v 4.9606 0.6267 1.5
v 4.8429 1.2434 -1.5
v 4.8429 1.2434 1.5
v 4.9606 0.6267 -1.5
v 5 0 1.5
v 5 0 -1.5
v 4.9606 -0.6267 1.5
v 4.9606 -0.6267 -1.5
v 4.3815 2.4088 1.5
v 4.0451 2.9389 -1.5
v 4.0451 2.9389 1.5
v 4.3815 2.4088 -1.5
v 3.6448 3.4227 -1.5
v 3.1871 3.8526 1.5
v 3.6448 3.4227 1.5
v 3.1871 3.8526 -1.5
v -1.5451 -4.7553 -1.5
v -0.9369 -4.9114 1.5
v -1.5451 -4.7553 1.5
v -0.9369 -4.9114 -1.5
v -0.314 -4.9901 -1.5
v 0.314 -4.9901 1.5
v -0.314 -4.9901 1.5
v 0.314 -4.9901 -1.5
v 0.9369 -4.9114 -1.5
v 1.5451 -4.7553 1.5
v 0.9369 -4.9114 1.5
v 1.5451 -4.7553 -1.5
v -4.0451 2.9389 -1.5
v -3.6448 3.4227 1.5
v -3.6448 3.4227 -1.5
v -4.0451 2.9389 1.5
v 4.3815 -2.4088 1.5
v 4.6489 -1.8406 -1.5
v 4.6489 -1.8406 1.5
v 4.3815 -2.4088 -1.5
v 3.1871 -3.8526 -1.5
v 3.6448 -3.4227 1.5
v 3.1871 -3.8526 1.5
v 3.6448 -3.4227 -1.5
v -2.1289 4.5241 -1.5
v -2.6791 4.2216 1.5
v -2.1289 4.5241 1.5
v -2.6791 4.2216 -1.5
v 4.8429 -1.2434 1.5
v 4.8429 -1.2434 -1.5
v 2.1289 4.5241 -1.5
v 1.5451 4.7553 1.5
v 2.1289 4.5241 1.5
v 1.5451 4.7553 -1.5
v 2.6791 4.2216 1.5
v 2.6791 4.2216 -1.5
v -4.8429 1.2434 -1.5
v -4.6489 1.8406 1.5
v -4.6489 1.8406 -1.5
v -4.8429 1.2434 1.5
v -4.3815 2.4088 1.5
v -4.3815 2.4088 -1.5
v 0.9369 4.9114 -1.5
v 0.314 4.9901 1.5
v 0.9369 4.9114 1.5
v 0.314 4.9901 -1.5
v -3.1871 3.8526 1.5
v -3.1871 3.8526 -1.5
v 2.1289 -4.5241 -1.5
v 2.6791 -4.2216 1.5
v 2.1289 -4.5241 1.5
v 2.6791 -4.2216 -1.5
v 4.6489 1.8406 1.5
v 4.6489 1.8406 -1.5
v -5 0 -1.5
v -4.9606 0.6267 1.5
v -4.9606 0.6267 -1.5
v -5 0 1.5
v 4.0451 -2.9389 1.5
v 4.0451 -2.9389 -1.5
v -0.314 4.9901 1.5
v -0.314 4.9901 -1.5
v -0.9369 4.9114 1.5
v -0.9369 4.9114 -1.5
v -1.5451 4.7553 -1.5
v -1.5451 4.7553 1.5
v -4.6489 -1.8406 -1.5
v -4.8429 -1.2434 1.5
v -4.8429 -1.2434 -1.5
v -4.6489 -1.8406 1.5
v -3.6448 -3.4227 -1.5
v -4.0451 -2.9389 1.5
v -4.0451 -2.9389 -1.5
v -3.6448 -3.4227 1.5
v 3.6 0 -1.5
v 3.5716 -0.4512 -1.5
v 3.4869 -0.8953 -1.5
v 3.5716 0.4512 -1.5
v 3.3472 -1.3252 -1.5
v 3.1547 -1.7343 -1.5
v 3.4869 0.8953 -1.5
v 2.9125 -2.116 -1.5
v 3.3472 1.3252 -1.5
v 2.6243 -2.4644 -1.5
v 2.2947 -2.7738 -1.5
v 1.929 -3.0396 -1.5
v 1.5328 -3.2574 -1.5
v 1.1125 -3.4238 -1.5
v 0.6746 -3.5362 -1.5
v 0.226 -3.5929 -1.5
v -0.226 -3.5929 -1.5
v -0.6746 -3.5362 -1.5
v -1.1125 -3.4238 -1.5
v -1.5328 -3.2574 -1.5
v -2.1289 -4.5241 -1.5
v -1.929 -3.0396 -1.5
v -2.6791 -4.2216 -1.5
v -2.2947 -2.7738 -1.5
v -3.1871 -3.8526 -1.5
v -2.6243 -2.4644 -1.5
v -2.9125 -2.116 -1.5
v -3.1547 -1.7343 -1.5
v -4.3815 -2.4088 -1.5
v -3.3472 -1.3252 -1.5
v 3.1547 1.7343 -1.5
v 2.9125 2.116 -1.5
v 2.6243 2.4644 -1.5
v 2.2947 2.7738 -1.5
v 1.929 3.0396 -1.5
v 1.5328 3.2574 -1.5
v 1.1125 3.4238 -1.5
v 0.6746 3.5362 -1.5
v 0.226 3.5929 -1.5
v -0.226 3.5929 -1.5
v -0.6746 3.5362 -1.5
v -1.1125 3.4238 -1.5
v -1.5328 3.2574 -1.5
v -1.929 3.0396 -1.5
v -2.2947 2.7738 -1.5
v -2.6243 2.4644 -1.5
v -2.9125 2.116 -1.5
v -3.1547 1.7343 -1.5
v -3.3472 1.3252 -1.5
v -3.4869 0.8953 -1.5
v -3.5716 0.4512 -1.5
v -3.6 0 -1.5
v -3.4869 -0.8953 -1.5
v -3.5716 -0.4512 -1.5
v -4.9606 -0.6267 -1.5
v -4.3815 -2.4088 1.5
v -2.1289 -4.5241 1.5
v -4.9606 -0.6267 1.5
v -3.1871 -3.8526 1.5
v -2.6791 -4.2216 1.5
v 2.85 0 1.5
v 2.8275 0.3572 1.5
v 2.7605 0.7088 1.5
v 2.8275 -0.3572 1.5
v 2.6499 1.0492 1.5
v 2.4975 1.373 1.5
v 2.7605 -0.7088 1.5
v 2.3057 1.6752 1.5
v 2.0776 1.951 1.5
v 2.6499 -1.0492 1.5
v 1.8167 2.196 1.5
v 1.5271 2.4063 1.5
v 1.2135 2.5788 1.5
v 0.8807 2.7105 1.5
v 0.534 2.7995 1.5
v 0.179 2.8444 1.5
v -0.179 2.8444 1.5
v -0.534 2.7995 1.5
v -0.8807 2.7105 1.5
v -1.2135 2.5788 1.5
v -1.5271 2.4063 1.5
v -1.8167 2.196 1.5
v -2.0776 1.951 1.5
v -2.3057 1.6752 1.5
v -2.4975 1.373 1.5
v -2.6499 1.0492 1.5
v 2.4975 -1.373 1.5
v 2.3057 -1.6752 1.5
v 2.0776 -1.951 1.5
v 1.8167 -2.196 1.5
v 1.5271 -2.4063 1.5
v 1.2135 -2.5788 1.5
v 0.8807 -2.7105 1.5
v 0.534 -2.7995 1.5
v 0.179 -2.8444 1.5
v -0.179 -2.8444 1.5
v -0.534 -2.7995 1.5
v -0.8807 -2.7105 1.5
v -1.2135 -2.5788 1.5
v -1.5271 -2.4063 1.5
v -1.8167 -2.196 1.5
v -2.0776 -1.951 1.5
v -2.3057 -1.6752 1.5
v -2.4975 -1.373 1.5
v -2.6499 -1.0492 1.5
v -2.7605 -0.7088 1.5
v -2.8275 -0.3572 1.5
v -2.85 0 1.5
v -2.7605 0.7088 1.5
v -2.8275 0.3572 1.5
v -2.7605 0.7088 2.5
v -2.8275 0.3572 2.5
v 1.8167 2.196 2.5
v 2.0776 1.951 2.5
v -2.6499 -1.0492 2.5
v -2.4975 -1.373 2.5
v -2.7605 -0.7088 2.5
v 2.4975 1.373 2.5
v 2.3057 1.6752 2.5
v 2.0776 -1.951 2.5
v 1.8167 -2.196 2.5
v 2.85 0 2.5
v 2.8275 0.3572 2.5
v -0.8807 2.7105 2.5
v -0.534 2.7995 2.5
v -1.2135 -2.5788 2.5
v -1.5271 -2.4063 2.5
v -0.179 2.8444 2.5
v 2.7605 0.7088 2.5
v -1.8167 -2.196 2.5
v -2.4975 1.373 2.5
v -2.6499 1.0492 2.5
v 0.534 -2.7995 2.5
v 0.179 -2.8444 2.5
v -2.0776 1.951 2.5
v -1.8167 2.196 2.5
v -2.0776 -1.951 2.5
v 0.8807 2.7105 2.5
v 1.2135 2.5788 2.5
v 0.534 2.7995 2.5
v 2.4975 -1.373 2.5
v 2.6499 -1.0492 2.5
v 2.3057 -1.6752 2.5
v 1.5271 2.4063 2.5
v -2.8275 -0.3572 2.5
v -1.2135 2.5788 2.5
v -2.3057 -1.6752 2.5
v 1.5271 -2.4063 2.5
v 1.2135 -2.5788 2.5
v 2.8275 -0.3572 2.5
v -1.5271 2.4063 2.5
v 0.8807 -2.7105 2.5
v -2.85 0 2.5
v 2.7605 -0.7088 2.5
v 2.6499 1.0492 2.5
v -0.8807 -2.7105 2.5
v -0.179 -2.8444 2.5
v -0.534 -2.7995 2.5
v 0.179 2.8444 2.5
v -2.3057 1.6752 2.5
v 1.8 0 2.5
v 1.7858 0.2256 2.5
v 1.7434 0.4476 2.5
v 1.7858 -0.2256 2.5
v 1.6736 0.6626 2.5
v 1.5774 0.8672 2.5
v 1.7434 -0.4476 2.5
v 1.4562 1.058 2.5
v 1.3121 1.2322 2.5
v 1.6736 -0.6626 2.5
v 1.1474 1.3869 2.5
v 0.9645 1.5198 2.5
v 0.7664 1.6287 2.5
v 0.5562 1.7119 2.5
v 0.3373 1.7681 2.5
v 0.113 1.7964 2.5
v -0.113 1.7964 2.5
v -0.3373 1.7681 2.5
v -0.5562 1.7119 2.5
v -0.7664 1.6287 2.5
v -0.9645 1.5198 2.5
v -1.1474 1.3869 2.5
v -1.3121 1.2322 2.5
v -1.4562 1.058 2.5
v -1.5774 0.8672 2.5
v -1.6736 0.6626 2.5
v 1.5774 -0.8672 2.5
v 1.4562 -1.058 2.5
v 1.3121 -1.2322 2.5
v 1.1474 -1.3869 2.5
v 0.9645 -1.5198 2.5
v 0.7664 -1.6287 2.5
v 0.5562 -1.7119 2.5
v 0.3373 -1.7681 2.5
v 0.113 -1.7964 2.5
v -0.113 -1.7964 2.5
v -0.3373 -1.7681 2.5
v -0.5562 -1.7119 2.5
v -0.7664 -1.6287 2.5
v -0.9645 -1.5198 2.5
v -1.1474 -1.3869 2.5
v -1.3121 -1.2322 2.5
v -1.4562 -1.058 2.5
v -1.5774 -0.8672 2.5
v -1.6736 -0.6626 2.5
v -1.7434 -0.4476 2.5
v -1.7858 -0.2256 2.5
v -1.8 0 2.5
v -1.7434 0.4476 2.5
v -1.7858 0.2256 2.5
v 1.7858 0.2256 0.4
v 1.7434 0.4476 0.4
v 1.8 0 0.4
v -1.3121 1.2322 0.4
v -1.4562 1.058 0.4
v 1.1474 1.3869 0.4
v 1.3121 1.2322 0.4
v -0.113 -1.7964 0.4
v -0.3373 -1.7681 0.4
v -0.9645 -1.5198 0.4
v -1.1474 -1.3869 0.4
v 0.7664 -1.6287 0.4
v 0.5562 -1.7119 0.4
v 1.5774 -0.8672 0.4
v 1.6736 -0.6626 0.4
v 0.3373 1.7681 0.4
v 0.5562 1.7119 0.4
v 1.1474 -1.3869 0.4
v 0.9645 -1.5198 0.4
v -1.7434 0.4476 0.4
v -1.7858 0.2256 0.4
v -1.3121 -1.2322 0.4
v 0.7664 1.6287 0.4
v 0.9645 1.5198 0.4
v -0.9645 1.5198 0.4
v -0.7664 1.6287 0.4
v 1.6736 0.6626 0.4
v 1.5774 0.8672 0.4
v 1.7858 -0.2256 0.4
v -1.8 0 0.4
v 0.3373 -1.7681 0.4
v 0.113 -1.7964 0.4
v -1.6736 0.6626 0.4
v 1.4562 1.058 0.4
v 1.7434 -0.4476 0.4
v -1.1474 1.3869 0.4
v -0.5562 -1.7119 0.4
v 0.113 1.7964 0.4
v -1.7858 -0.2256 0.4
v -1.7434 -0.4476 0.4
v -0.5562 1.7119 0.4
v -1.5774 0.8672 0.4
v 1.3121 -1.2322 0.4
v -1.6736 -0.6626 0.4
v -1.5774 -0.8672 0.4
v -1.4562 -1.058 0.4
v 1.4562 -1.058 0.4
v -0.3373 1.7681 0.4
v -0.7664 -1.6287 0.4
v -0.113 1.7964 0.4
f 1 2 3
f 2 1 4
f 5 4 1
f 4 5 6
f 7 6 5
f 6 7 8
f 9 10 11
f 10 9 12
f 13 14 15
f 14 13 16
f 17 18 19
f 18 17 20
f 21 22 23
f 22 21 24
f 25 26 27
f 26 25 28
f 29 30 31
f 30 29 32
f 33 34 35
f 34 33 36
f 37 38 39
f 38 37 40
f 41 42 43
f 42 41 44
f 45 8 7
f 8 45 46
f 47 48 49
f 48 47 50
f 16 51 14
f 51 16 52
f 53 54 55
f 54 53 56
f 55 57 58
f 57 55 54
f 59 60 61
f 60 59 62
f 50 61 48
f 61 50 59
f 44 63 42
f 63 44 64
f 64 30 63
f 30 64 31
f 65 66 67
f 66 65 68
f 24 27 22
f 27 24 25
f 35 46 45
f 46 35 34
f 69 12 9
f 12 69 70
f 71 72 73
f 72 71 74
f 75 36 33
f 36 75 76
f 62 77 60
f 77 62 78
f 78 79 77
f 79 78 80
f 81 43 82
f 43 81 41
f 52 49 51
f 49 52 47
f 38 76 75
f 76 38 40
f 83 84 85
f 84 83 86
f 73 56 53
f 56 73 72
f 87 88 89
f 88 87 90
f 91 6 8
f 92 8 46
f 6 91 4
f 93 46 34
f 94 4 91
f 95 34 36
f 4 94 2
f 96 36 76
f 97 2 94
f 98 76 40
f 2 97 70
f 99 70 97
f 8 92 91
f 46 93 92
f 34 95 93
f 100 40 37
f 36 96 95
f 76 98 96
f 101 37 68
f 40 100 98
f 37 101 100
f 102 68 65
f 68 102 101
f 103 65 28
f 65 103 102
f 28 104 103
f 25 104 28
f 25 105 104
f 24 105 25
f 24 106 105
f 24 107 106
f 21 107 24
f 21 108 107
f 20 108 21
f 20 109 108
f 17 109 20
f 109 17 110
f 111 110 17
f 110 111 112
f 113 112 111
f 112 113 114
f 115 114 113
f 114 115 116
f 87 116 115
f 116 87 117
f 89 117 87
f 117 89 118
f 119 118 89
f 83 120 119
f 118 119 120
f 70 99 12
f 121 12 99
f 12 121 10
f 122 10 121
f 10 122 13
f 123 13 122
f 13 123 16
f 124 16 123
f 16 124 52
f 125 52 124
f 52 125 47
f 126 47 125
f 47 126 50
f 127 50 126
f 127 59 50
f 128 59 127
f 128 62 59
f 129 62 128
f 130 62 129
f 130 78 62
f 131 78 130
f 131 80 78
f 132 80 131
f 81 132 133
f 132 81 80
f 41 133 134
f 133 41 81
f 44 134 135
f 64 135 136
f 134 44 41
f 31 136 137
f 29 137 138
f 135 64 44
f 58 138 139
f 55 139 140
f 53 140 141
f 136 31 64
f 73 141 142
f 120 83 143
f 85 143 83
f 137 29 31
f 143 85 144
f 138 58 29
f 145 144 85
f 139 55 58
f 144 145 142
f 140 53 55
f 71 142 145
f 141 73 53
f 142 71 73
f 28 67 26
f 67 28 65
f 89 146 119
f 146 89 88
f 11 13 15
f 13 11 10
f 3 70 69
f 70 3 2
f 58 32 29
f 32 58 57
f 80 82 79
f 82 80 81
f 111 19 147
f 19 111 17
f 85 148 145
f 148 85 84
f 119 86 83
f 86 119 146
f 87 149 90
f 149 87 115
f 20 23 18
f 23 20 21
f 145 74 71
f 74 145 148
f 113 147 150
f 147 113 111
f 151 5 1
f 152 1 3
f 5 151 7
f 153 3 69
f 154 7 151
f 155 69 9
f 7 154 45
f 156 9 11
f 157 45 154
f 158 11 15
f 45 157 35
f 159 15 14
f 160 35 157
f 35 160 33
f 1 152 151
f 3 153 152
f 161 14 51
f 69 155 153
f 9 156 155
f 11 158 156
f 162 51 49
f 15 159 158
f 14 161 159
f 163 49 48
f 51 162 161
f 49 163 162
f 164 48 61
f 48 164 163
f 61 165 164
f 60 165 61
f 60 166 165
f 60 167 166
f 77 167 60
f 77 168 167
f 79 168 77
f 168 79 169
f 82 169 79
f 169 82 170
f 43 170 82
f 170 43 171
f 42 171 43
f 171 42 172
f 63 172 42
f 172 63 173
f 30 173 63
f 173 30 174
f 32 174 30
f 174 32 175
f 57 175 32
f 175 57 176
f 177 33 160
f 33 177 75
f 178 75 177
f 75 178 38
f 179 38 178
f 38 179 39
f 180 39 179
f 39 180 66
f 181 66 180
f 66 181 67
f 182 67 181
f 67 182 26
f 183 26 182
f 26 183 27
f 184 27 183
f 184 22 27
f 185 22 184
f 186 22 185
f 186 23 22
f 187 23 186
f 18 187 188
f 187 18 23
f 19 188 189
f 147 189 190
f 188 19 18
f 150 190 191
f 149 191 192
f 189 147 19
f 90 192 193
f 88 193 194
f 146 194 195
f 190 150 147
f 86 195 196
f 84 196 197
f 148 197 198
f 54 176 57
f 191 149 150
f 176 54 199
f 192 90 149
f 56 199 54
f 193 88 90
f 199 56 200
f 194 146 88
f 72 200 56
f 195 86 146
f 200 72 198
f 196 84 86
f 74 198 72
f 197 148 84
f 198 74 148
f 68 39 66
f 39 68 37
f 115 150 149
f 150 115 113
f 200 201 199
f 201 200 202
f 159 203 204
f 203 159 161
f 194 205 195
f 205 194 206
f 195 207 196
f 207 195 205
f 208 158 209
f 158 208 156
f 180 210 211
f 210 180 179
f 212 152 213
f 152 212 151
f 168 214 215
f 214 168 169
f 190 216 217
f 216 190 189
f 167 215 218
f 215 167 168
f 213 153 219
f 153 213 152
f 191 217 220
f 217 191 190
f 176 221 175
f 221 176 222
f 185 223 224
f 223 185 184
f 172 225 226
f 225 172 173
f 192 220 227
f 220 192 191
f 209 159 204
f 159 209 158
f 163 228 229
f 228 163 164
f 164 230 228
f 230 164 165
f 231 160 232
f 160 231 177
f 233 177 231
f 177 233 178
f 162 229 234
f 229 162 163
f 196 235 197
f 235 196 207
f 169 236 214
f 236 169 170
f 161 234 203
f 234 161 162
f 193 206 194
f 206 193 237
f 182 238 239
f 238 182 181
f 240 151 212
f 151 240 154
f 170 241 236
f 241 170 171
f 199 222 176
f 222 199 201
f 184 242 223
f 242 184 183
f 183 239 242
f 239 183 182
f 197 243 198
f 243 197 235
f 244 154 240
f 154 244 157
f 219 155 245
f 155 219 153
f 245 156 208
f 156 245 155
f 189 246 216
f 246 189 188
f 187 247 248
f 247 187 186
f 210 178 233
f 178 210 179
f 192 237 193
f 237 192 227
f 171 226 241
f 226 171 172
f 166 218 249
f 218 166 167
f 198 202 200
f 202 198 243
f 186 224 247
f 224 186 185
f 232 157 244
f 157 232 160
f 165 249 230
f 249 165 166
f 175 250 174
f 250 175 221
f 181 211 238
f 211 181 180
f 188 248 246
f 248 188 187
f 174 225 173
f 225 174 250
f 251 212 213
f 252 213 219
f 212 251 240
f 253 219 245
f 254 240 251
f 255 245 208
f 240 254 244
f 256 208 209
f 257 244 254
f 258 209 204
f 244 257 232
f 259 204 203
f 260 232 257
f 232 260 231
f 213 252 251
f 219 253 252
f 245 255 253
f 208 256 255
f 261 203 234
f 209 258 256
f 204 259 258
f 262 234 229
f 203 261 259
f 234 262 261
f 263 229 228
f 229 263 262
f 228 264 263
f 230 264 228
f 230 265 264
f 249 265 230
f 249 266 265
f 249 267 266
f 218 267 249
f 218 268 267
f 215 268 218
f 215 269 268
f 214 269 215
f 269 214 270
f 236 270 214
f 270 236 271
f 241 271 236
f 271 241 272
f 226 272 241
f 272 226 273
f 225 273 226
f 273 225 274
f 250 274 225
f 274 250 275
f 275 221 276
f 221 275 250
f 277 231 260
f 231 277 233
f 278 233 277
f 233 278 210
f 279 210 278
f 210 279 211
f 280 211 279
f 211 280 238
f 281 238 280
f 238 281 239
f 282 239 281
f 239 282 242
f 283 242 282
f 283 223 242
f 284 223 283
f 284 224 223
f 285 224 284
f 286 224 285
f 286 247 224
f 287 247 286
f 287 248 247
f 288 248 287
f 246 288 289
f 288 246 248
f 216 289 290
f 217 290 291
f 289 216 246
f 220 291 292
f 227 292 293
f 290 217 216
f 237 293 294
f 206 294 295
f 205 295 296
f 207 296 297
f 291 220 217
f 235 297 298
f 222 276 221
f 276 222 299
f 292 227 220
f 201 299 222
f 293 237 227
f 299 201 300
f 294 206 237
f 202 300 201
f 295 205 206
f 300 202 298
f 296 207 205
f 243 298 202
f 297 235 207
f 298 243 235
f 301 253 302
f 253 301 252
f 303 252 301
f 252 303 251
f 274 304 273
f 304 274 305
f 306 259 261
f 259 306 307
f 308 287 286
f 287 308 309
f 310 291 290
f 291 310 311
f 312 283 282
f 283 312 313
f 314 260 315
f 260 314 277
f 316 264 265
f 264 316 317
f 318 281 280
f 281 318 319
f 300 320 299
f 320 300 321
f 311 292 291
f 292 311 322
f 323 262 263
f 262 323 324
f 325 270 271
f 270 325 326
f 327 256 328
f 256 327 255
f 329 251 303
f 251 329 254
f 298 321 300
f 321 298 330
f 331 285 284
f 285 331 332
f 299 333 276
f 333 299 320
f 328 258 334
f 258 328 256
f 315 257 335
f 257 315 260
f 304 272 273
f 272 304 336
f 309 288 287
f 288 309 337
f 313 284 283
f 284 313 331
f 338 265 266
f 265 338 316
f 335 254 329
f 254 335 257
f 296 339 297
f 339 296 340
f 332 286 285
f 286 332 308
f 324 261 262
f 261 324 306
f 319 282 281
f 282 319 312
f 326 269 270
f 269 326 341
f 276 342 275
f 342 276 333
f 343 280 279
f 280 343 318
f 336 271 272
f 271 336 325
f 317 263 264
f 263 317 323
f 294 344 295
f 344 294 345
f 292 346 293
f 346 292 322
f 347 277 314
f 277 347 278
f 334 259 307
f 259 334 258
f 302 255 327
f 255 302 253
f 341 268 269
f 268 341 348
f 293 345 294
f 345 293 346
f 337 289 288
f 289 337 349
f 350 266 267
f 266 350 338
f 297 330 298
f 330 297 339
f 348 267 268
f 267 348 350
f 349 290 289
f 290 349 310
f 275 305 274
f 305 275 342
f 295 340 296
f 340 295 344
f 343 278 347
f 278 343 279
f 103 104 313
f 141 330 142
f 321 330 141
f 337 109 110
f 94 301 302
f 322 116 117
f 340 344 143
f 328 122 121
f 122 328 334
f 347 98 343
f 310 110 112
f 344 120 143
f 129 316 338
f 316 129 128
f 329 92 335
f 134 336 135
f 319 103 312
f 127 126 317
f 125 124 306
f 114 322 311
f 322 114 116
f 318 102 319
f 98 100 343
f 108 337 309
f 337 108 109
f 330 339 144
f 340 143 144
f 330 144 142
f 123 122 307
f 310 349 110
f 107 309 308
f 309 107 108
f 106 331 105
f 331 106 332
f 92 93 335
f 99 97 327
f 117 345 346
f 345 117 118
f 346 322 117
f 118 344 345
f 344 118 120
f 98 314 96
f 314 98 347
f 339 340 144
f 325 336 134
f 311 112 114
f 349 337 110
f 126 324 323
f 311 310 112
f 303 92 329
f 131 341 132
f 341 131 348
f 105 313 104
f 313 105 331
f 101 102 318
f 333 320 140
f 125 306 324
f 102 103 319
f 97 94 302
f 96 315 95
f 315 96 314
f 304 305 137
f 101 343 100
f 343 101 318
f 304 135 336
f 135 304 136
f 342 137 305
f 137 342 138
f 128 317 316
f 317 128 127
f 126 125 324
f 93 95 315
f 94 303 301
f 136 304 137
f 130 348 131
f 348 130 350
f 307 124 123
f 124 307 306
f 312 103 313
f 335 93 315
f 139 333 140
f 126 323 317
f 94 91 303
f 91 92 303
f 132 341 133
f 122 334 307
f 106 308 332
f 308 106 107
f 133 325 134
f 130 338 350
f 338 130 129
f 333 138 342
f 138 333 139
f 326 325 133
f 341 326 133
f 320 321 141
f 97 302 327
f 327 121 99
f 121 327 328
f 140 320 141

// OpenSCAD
$fn = 50;


difference() {
	union() {
		translate(v = [0, 0, -1.5000000000]) {
			rotate(a = [0, 0, 0]) {
				cylinder(h = 3, r = 5.0000000000);
			}
		}
		translate(v = [0, 0, -1.5000000000]) {
			rotate(a = [0, 0, 0]) {
				cylinder(h = 4, r = 2.8500000000);
			}
		}
	}
	union() {
		translate(v = [0, 0, -125.0000000000]) {
			rotate(a = [0, 0, 0]) {
				cylinder(h = 250, r = 1.8000000000);
			}
		}
		#translate(v = [0, 0, 0.4000000000]) {
			rotate(a = [0, 180, 0]) {
				cylinder(h = 1.9000000000, r1 = 1.8000000000, r2 = 3.6000000000);
			}
		}
		#translate(v = [0, 0, 2.5000000000]) {
			rotate(a = [0, 180, 0]) {
				cylinder(h = 4, r = 1.8000000000);
			}
		}
	}
}
